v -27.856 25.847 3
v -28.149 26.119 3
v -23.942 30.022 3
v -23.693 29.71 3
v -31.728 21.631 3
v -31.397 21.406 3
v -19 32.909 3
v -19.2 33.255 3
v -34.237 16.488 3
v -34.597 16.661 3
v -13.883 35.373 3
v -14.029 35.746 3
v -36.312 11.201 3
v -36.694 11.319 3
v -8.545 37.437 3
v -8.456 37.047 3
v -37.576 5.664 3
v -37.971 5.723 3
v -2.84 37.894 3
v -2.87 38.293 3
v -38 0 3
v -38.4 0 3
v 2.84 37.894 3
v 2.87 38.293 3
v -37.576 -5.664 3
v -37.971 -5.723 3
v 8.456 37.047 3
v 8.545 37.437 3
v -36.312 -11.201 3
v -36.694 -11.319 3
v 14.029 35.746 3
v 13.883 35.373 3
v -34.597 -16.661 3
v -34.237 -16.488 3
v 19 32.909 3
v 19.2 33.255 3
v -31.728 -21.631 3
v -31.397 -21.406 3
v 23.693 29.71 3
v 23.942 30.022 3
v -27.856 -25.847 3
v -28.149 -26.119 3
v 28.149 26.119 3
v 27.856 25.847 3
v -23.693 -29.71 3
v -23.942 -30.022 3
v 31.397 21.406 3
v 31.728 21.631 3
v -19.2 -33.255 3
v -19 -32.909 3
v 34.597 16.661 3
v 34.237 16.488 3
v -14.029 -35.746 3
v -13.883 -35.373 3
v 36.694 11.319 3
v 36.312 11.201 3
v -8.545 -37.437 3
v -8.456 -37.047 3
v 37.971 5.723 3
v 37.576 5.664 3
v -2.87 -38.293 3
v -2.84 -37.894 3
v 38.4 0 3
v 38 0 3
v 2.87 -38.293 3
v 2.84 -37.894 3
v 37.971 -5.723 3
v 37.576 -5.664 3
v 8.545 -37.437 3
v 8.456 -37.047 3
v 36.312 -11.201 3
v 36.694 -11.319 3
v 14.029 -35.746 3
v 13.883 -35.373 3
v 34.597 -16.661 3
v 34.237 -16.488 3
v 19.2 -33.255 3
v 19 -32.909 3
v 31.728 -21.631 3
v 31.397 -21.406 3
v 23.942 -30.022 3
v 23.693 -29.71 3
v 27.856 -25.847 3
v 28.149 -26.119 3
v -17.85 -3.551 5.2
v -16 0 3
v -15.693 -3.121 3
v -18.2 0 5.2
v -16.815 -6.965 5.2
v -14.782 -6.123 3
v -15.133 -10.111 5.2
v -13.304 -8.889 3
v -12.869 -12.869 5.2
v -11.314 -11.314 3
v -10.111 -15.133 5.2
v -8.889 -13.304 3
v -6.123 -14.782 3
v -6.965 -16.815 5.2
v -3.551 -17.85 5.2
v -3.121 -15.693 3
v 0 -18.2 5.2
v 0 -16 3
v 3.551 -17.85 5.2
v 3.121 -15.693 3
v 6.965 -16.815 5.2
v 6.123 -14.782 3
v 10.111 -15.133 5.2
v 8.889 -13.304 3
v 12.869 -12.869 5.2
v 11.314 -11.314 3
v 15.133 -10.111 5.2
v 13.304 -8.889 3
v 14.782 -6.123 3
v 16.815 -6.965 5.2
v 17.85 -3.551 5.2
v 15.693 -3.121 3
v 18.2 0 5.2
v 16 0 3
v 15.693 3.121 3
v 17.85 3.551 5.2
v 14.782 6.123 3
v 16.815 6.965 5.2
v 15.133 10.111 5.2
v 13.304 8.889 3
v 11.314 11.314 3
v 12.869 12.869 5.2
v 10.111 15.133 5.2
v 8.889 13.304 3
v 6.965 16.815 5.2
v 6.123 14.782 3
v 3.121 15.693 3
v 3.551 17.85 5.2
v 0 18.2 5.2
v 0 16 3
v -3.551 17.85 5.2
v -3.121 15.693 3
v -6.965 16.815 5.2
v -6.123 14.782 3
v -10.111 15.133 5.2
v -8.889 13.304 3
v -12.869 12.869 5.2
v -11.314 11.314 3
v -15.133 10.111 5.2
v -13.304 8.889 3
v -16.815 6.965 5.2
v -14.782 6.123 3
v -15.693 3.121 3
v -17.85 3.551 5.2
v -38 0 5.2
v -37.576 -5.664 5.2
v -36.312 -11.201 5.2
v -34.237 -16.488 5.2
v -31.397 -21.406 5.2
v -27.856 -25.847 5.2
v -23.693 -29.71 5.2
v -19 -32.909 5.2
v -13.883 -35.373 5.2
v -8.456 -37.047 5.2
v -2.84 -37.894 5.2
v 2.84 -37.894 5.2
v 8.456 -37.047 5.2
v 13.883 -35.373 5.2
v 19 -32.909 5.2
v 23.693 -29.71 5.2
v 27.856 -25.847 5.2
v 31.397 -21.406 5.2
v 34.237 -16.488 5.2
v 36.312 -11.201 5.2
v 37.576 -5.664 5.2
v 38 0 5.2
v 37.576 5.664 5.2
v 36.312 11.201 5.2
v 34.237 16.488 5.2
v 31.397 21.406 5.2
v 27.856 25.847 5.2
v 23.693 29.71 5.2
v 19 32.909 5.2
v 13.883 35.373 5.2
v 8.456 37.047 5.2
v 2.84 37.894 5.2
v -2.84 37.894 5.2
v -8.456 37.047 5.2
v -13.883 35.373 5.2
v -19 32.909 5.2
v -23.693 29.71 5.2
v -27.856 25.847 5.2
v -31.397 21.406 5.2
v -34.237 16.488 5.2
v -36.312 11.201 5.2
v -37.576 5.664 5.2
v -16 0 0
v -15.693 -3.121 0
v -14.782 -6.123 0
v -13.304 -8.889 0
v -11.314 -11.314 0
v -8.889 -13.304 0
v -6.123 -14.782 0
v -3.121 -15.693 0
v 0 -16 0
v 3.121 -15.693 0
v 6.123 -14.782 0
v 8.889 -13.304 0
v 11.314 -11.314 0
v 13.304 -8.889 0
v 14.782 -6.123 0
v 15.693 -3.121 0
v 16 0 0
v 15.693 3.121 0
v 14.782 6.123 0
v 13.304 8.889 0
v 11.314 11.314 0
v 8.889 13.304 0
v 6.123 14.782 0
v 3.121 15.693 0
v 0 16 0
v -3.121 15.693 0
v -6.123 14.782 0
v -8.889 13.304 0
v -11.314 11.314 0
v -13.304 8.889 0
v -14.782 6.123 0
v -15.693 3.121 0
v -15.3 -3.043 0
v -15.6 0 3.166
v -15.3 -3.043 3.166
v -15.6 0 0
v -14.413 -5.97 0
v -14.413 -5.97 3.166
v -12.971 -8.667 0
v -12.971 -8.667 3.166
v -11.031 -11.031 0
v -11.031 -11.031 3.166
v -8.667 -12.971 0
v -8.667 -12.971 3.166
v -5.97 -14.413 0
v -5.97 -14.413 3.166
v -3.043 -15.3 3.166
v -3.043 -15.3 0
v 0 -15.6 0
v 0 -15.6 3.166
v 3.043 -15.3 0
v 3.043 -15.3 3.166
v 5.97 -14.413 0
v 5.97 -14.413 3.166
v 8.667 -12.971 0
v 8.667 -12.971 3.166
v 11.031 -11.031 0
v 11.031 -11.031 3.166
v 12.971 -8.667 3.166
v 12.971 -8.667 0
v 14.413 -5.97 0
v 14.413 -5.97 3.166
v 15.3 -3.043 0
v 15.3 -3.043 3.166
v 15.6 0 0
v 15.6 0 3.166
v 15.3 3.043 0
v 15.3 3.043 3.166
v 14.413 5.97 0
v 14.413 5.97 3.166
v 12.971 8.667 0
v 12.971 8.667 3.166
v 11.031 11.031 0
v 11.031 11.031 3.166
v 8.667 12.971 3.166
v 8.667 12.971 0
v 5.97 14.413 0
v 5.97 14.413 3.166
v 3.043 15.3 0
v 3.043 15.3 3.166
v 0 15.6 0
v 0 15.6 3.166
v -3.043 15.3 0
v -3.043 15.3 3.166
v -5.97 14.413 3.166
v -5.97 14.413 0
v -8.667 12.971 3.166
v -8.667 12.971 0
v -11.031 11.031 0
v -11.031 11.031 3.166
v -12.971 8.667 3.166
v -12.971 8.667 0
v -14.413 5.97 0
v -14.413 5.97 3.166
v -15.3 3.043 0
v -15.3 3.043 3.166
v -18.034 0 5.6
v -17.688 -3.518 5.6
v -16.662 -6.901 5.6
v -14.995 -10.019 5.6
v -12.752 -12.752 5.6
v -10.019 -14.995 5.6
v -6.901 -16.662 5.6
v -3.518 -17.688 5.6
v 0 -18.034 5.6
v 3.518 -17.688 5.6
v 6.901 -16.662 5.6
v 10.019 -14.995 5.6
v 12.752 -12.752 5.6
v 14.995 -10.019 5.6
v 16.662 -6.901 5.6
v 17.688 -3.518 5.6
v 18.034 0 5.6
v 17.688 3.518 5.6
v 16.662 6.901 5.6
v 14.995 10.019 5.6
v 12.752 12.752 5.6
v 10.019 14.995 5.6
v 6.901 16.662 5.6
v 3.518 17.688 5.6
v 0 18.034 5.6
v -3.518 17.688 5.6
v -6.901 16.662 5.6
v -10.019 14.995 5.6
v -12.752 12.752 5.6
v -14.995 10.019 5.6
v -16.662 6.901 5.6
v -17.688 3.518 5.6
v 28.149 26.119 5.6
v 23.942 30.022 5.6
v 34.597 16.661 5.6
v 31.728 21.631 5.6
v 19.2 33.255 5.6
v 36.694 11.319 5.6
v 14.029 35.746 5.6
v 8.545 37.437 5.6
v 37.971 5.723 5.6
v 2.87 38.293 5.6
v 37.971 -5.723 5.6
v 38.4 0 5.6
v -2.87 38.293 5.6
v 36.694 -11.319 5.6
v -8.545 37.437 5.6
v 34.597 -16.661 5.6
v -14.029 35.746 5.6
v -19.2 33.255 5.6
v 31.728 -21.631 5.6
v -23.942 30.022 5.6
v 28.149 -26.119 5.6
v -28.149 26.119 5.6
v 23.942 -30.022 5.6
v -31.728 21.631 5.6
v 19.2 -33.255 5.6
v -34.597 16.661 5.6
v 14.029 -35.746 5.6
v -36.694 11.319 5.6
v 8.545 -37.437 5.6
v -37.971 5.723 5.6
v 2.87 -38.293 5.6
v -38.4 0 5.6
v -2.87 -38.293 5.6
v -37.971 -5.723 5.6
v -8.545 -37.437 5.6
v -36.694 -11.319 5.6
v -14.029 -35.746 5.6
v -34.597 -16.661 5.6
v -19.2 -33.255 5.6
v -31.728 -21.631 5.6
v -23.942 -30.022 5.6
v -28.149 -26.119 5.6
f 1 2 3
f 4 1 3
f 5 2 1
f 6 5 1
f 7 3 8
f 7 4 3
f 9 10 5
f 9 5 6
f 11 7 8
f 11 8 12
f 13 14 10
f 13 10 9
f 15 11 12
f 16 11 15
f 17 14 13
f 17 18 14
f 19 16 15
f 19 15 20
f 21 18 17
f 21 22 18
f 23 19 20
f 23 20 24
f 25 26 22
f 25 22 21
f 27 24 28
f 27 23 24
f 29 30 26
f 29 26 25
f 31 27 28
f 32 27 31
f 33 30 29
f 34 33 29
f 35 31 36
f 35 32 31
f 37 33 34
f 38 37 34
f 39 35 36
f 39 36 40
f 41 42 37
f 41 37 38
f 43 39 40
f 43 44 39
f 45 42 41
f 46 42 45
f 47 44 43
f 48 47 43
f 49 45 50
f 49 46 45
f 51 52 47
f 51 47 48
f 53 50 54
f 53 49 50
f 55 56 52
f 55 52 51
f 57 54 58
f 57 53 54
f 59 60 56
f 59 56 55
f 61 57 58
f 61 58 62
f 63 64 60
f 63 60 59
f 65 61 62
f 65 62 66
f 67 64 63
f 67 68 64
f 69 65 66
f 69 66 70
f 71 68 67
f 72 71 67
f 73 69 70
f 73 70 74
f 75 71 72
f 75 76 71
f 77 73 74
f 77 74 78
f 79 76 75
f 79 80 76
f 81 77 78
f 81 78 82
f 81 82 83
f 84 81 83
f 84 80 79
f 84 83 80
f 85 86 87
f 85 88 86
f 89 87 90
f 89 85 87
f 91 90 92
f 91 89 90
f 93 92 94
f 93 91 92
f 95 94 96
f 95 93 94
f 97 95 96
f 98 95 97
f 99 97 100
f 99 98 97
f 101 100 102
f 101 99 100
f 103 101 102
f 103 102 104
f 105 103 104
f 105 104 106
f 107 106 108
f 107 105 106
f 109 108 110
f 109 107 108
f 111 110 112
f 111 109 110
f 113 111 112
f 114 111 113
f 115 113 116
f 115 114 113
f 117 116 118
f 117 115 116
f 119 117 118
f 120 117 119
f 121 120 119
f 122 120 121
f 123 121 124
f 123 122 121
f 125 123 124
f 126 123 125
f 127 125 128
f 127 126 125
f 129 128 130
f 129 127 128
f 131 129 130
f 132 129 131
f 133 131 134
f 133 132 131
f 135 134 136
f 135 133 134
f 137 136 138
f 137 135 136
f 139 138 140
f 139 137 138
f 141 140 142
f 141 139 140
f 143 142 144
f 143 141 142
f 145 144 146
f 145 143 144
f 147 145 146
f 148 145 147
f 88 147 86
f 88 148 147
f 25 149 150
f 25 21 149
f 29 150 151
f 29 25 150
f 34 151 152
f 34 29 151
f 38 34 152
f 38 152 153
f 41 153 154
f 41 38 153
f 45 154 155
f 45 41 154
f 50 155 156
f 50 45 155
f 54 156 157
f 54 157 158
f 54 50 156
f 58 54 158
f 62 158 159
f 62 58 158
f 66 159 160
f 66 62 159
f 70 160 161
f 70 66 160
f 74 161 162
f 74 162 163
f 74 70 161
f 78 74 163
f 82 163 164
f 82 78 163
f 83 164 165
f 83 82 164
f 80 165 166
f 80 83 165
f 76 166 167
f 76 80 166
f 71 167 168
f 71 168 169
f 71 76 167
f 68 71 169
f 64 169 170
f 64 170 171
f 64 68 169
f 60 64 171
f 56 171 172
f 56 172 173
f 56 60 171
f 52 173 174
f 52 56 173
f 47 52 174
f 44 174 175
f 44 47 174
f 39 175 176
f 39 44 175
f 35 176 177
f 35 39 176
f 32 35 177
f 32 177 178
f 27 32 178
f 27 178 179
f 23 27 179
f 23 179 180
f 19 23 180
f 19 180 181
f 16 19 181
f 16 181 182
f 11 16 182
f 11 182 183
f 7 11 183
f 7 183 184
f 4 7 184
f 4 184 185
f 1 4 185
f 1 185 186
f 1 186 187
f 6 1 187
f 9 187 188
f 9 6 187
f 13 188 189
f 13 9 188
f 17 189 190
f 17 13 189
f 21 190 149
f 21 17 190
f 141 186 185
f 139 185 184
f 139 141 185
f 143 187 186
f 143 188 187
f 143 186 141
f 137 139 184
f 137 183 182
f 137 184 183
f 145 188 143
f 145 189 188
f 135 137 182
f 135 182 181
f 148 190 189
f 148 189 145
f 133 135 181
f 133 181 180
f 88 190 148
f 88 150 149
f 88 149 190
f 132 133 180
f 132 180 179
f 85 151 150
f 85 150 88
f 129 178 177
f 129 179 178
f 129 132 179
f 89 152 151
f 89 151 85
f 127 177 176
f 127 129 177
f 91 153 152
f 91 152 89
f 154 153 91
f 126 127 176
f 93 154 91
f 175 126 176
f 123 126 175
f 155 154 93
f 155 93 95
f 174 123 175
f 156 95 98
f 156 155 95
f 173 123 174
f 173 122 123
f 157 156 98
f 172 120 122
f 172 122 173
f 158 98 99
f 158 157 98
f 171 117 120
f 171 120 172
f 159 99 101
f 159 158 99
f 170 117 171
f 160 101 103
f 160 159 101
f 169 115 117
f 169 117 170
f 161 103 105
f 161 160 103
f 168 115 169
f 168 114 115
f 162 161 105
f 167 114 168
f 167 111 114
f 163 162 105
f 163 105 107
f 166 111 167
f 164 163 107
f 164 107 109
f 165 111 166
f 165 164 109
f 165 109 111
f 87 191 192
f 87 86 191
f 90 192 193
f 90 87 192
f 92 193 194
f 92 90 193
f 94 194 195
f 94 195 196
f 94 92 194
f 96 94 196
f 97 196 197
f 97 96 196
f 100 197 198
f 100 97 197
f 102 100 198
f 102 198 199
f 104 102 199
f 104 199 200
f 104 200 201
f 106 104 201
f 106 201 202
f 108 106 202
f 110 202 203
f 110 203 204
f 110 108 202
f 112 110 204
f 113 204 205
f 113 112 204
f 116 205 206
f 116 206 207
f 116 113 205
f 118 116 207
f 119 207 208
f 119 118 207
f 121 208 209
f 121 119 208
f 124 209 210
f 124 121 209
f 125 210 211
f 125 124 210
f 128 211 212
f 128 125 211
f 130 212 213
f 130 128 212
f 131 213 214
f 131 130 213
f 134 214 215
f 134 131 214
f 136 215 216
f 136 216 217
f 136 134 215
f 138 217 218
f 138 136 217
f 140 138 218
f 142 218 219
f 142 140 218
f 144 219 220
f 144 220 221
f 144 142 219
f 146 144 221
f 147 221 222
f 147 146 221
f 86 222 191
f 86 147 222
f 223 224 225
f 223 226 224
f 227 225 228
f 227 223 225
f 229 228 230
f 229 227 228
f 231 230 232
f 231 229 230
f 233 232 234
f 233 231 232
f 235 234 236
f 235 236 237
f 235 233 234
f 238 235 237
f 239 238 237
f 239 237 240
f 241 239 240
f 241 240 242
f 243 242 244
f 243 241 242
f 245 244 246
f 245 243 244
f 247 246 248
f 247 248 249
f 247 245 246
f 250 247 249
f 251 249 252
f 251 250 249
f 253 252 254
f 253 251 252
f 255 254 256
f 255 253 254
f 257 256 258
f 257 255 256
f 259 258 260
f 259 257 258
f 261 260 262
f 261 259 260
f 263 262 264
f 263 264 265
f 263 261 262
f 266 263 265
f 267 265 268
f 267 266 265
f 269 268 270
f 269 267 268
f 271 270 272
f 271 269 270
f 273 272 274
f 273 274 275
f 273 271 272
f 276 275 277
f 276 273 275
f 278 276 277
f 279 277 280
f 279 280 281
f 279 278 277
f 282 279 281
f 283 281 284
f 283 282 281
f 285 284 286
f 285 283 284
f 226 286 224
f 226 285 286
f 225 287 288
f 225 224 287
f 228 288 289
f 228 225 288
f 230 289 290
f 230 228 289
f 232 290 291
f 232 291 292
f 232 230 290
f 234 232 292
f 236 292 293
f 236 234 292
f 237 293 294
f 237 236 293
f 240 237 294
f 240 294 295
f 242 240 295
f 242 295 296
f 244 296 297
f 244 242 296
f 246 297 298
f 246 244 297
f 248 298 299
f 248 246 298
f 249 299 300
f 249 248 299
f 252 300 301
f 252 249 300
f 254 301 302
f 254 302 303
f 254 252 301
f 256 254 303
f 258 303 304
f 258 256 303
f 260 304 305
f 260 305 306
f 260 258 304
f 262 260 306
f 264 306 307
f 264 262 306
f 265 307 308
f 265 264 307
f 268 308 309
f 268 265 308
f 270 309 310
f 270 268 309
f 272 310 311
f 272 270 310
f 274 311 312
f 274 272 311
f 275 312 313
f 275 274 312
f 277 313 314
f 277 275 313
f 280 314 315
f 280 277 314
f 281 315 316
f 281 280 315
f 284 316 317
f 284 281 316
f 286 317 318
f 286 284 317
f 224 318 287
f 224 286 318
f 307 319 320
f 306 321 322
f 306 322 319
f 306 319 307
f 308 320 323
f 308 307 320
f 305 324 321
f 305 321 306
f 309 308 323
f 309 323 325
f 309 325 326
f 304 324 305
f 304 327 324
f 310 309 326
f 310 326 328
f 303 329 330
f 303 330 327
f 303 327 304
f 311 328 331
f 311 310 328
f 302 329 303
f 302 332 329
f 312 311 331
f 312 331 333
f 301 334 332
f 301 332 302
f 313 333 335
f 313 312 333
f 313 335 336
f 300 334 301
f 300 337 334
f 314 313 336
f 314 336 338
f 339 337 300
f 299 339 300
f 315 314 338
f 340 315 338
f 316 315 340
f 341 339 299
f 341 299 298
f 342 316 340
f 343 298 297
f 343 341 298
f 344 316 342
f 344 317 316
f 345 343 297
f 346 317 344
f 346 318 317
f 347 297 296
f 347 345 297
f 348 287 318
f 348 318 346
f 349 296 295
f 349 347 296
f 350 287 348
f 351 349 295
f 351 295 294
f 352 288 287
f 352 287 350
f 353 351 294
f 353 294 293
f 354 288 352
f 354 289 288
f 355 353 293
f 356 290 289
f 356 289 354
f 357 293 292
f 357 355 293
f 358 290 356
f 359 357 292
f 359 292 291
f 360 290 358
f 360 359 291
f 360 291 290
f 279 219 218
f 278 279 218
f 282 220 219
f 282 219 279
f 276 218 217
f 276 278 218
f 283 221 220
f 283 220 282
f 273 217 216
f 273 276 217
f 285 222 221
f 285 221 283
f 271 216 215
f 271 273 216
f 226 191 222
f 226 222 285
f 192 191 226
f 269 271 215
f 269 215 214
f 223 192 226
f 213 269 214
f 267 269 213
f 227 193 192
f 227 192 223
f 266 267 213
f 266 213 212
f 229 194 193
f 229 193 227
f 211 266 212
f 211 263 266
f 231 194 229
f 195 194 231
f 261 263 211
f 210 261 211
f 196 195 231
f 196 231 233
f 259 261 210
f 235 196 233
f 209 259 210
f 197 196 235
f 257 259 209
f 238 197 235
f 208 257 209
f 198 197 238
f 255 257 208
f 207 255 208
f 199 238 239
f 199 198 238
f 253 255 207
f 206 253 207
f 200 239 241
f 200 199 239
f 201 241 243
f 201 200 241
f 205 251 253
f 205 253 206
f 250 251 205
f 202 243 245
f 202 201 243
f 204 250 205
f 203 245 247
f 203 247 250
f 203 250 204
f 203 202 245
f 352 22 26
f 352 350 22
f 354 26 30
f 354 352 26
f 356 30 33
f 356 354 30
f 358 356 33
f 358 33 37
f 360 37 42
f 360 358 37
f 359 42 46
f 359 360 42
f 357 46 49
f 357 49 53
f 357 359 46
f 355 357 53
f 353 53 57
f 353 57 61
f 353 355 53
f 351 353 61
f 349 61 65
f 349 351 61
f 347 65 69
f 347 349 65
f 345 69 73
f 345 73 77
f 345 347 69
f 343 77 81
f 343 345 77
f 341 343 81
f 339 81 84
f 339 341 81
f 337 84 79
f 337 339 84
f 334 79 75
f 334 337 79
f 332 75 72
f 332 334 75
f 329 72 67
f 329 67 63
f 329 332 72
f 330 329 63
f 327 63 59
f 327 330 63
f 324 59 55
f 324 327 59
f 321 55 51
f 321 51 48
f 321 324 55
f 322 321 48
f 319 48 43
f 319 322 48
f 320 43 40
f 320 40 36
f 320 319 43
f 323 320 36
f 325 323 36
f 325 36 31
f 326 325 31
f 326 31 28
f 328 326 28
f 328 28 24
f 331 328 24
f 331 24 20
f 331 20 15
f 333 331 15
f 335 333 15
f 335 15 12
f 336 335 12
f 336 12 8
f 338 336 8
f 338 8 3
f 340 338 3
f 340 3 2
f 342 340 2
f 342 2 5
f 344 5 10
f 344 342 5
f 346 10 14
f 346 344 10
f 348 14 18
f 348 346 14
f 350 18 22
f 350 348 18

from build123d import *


with BuildPart() as part:
    # Sketch1 → Revolve-Thin1 (revolve)
    with BuildSketch(Plane(origin=(0, 0, 0), x_dir=(0, 0, -1), z_dir=(1, 0, 0)), mode=Mode.PRIVATE) as revolve_thin1_sk:
        Polygon((0, 16), (-3, 16), (-5.2, 18.2), (-5.2, 38), (-3, 38), (-3, 38.4), (-5.6, 38.4), (-5.6, 18.034314575), (-3.165685425, 15.6), (0, 15.6), align=None)
    revolve(revolve_thin1_sk.sketch.rotate(Axis((0, 0, 0), (0, 0, 1)), 90), axis=Axis((0, 0, 0), (0, 0, 1)))


solid = part.part
